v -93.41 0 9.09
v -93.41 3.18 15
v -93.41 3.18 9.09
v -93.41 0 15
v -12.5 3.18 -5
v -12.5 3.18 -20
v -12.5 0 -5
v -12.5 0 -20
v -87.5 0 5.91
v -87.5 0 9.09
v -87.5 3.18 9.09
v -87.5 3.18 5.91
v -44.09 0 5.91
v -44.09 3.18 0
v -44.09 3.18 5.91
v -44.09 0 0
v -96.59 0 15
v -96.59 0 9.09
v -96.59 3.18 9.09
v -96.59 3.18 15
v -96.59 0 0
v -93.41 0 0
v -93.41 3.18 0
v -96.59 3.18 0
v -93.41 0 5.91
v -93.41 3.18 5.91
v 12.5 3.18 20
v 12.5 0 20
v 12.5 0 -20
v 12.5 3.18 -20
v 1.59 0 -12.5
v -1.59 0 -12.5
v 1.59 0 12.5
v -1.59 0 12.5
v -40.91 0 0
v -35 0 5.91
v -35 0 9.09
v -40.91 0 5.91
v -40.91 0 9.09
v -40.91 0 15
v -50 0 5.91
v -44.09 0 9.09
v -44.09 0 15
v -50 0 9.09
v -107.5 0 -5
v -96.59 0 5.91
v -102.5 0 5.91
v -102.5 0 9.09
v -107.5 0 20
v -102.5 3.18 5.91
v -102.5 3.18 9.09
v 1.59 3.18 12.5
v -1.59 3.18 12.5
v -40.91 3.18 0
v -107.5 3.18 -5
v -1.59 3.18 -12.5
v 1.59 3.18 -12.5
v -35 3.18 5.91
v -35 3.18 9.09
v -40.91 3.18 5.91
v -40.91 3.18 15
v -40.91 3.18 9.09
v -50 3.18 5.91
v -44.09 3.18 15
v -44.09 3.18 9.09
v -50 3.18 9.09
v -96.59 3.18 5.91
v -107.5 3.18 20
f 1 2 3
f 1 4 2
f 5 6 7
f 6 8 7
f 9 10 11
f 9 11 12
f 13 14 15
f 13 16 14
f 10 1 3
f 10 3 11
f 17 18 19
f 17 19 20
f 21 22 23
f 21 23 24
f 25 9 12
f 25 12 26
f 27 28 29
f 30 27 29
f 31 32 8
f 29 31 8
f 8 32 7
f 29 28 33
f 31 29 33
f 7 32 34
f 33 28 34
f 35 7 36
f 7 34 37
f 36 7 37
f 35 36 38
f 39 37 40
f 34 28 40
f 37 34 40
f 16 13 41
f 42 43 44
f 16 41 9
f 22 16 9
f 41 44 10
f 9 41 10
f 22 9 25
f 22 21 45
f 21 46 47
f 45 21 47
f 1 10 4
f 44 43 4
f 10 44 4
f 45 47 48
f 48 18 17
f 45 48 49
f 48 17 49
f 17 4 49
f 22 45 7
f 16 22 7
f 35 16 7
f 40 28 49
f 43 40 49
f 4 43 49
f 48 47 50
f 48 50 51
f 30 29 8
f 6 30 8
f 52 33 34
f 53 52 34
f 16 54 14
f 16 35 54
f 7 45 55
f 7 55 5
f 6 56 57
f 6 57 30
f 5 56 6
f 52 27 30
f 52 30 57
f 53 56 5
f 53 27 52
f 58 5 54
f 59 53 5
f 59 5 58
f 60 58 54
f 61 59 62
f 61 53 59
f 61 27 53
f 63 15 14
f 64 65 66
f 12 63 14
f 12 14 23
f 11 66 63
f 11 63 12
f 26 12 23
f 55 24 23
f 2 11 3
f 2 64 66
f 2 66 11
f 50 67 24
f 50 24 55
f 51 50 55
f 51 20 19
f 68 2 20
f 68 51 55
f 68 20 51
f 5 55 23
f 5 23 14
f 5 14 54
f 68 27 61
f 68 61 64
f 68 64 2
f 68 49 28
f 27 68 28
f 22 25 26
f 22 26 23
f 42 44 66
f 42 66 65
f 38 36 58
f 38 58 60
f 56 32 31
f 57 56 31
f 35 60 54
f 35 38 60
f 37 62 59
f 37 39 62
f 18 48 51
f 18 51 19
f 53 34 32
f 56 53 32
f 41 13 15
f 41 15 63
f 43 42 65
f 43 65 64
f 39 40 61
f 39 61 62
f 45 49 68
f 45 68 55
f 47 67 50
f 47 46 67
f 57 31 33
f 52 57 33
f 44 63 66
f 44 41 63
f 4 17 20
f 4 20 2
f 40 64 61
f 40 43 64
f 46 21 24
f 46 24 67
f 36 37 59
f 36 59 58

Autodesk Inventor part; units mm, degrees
ref_plane "YZ Plane" through (0, 0, 0) normal (1, 0, 0) x (0, 1, 0)
ref_plane "XZ Plane" through (0, 0, 0) normal (0, 1, 0) x (-1, 0, 0)
ref_plane "XY Plane" through (0, 0, 0) normal (0, 0, 1) x (1, 0, 0)
sketch "Sketch1" plane through (0, 0, 0) normal (0, 1, 0) x (-1, 0, 0)
  line L0 (-1.59, 12.5) -> (1.59, 12.5)
  line L1 (1.59, 12.5) -> (1.59, -12.5)
  line L2 (1.59, -12.5) -> (-1.59, -12.5)
  line L3 (-1.59, -12.5) -> (-1.59, 12.5)
  line L4 (-1.59, 12.5) -> (1.59, -12.5) construction
  line L5 (1.59, 12.5) -> (-1.59, -12.5) construction
  line L6 (12.5, 20) -> (-12.5, 20)
  line L7 (-12.5, 20) -> (-12.5, -20)
  line L8 (-12.5, -20) -> (12.5, -20)
  line L9 (12.5, -20) -> (12.5, 20)
  line L10 (12.5, 20) -> (107.5, 20)
  line L11 (107.5, 20) -> (107.5, -5)
  line L12 (107.5, -5) -> (12.5, -5)
  line L13 (12.5, -5) -> (12.5, 20)
  line L14 (107.5, 20) -> (82.5, 20)
  line L15 (88.91, 20) -> (92.09, 20)
  line L16 (102.5, 9.09) -> (87.5, 9.09)
  line L17 (87.5, 9.09) -> (87.5, 5.91)
  line L18 (87.5, 5.91) -> (102.5, 5.91)
  line L19 (102.5, 5.91) -> (102.5, 9.09)
  line L20 (96.59, 15) -> (93.41, 15)
  line L21 (93.41, 15) -> (93.41, 0)
  line L22 (93.41, 0) -> (96.59, 0)
  line L23 (96.59, 0) -> (96.59, 15)
  line L24 (96.59, 15) -> (93.41, 0) construction
  line L25 (93.41, 15) -> (96.59, 0) construction
  line L26 (50, 9.09) -> (35, 9.09)
  line L27 (35, 9.09) -> (35, 5.91)
  line L28 (35, 5.91) -> (50, 5.91)
  line L29 (50, 5.91) -> (50, 9.09)
  line L30 (44.09, 15) -> (40.91, 15)
  line L31 (40.91, 15) -> (40.91, 0)
  line L32 (40.91, 0) -> (44.09, 0)
  line L33 (44.09, 0) -> (44.09, 15)
  line L34 (44.09, 15) -> (40.91, 0) construction
  line L35 (40.91, 15) -> (44.09, 0) construction
  point P0 (0, 0)
  point P1 (95, 7.5)
  point P2 (42.5, 7.5)
  dimension "d0" = 3.18
  dimension "d1" = 25
  dimension "d2" = 25
  dimension "d3" = 12.5
  dimension "d4" = 20
  dimension "d5" = 20
  dimension "d6" = 95
  dimension "d7" = 25
  dimension "d35" = 15
  dimension "d36" = 3.18
  dimension "d38" = 3.18
  dimension "d39" = 15
  dimension "d40" = 7.5
  dimension "d41" = 1.59
  dimension "d42" = 12.5
  dimension "d43" = 12.5
  dimension "d44" = 15
  dimension "d45" = 3.18
  dimension "d46" = 3.18
  dimension "d47" = 15
  dimension "d48" = 7.5
  dimension "d49" = 1.59
  dimension "d50" = 30
  dimension "d51" = 12.5
extrude "Extrusion2" add sketch "Sketch1" along normal blind 3.18
properties part number "Brazo_Inferior"
